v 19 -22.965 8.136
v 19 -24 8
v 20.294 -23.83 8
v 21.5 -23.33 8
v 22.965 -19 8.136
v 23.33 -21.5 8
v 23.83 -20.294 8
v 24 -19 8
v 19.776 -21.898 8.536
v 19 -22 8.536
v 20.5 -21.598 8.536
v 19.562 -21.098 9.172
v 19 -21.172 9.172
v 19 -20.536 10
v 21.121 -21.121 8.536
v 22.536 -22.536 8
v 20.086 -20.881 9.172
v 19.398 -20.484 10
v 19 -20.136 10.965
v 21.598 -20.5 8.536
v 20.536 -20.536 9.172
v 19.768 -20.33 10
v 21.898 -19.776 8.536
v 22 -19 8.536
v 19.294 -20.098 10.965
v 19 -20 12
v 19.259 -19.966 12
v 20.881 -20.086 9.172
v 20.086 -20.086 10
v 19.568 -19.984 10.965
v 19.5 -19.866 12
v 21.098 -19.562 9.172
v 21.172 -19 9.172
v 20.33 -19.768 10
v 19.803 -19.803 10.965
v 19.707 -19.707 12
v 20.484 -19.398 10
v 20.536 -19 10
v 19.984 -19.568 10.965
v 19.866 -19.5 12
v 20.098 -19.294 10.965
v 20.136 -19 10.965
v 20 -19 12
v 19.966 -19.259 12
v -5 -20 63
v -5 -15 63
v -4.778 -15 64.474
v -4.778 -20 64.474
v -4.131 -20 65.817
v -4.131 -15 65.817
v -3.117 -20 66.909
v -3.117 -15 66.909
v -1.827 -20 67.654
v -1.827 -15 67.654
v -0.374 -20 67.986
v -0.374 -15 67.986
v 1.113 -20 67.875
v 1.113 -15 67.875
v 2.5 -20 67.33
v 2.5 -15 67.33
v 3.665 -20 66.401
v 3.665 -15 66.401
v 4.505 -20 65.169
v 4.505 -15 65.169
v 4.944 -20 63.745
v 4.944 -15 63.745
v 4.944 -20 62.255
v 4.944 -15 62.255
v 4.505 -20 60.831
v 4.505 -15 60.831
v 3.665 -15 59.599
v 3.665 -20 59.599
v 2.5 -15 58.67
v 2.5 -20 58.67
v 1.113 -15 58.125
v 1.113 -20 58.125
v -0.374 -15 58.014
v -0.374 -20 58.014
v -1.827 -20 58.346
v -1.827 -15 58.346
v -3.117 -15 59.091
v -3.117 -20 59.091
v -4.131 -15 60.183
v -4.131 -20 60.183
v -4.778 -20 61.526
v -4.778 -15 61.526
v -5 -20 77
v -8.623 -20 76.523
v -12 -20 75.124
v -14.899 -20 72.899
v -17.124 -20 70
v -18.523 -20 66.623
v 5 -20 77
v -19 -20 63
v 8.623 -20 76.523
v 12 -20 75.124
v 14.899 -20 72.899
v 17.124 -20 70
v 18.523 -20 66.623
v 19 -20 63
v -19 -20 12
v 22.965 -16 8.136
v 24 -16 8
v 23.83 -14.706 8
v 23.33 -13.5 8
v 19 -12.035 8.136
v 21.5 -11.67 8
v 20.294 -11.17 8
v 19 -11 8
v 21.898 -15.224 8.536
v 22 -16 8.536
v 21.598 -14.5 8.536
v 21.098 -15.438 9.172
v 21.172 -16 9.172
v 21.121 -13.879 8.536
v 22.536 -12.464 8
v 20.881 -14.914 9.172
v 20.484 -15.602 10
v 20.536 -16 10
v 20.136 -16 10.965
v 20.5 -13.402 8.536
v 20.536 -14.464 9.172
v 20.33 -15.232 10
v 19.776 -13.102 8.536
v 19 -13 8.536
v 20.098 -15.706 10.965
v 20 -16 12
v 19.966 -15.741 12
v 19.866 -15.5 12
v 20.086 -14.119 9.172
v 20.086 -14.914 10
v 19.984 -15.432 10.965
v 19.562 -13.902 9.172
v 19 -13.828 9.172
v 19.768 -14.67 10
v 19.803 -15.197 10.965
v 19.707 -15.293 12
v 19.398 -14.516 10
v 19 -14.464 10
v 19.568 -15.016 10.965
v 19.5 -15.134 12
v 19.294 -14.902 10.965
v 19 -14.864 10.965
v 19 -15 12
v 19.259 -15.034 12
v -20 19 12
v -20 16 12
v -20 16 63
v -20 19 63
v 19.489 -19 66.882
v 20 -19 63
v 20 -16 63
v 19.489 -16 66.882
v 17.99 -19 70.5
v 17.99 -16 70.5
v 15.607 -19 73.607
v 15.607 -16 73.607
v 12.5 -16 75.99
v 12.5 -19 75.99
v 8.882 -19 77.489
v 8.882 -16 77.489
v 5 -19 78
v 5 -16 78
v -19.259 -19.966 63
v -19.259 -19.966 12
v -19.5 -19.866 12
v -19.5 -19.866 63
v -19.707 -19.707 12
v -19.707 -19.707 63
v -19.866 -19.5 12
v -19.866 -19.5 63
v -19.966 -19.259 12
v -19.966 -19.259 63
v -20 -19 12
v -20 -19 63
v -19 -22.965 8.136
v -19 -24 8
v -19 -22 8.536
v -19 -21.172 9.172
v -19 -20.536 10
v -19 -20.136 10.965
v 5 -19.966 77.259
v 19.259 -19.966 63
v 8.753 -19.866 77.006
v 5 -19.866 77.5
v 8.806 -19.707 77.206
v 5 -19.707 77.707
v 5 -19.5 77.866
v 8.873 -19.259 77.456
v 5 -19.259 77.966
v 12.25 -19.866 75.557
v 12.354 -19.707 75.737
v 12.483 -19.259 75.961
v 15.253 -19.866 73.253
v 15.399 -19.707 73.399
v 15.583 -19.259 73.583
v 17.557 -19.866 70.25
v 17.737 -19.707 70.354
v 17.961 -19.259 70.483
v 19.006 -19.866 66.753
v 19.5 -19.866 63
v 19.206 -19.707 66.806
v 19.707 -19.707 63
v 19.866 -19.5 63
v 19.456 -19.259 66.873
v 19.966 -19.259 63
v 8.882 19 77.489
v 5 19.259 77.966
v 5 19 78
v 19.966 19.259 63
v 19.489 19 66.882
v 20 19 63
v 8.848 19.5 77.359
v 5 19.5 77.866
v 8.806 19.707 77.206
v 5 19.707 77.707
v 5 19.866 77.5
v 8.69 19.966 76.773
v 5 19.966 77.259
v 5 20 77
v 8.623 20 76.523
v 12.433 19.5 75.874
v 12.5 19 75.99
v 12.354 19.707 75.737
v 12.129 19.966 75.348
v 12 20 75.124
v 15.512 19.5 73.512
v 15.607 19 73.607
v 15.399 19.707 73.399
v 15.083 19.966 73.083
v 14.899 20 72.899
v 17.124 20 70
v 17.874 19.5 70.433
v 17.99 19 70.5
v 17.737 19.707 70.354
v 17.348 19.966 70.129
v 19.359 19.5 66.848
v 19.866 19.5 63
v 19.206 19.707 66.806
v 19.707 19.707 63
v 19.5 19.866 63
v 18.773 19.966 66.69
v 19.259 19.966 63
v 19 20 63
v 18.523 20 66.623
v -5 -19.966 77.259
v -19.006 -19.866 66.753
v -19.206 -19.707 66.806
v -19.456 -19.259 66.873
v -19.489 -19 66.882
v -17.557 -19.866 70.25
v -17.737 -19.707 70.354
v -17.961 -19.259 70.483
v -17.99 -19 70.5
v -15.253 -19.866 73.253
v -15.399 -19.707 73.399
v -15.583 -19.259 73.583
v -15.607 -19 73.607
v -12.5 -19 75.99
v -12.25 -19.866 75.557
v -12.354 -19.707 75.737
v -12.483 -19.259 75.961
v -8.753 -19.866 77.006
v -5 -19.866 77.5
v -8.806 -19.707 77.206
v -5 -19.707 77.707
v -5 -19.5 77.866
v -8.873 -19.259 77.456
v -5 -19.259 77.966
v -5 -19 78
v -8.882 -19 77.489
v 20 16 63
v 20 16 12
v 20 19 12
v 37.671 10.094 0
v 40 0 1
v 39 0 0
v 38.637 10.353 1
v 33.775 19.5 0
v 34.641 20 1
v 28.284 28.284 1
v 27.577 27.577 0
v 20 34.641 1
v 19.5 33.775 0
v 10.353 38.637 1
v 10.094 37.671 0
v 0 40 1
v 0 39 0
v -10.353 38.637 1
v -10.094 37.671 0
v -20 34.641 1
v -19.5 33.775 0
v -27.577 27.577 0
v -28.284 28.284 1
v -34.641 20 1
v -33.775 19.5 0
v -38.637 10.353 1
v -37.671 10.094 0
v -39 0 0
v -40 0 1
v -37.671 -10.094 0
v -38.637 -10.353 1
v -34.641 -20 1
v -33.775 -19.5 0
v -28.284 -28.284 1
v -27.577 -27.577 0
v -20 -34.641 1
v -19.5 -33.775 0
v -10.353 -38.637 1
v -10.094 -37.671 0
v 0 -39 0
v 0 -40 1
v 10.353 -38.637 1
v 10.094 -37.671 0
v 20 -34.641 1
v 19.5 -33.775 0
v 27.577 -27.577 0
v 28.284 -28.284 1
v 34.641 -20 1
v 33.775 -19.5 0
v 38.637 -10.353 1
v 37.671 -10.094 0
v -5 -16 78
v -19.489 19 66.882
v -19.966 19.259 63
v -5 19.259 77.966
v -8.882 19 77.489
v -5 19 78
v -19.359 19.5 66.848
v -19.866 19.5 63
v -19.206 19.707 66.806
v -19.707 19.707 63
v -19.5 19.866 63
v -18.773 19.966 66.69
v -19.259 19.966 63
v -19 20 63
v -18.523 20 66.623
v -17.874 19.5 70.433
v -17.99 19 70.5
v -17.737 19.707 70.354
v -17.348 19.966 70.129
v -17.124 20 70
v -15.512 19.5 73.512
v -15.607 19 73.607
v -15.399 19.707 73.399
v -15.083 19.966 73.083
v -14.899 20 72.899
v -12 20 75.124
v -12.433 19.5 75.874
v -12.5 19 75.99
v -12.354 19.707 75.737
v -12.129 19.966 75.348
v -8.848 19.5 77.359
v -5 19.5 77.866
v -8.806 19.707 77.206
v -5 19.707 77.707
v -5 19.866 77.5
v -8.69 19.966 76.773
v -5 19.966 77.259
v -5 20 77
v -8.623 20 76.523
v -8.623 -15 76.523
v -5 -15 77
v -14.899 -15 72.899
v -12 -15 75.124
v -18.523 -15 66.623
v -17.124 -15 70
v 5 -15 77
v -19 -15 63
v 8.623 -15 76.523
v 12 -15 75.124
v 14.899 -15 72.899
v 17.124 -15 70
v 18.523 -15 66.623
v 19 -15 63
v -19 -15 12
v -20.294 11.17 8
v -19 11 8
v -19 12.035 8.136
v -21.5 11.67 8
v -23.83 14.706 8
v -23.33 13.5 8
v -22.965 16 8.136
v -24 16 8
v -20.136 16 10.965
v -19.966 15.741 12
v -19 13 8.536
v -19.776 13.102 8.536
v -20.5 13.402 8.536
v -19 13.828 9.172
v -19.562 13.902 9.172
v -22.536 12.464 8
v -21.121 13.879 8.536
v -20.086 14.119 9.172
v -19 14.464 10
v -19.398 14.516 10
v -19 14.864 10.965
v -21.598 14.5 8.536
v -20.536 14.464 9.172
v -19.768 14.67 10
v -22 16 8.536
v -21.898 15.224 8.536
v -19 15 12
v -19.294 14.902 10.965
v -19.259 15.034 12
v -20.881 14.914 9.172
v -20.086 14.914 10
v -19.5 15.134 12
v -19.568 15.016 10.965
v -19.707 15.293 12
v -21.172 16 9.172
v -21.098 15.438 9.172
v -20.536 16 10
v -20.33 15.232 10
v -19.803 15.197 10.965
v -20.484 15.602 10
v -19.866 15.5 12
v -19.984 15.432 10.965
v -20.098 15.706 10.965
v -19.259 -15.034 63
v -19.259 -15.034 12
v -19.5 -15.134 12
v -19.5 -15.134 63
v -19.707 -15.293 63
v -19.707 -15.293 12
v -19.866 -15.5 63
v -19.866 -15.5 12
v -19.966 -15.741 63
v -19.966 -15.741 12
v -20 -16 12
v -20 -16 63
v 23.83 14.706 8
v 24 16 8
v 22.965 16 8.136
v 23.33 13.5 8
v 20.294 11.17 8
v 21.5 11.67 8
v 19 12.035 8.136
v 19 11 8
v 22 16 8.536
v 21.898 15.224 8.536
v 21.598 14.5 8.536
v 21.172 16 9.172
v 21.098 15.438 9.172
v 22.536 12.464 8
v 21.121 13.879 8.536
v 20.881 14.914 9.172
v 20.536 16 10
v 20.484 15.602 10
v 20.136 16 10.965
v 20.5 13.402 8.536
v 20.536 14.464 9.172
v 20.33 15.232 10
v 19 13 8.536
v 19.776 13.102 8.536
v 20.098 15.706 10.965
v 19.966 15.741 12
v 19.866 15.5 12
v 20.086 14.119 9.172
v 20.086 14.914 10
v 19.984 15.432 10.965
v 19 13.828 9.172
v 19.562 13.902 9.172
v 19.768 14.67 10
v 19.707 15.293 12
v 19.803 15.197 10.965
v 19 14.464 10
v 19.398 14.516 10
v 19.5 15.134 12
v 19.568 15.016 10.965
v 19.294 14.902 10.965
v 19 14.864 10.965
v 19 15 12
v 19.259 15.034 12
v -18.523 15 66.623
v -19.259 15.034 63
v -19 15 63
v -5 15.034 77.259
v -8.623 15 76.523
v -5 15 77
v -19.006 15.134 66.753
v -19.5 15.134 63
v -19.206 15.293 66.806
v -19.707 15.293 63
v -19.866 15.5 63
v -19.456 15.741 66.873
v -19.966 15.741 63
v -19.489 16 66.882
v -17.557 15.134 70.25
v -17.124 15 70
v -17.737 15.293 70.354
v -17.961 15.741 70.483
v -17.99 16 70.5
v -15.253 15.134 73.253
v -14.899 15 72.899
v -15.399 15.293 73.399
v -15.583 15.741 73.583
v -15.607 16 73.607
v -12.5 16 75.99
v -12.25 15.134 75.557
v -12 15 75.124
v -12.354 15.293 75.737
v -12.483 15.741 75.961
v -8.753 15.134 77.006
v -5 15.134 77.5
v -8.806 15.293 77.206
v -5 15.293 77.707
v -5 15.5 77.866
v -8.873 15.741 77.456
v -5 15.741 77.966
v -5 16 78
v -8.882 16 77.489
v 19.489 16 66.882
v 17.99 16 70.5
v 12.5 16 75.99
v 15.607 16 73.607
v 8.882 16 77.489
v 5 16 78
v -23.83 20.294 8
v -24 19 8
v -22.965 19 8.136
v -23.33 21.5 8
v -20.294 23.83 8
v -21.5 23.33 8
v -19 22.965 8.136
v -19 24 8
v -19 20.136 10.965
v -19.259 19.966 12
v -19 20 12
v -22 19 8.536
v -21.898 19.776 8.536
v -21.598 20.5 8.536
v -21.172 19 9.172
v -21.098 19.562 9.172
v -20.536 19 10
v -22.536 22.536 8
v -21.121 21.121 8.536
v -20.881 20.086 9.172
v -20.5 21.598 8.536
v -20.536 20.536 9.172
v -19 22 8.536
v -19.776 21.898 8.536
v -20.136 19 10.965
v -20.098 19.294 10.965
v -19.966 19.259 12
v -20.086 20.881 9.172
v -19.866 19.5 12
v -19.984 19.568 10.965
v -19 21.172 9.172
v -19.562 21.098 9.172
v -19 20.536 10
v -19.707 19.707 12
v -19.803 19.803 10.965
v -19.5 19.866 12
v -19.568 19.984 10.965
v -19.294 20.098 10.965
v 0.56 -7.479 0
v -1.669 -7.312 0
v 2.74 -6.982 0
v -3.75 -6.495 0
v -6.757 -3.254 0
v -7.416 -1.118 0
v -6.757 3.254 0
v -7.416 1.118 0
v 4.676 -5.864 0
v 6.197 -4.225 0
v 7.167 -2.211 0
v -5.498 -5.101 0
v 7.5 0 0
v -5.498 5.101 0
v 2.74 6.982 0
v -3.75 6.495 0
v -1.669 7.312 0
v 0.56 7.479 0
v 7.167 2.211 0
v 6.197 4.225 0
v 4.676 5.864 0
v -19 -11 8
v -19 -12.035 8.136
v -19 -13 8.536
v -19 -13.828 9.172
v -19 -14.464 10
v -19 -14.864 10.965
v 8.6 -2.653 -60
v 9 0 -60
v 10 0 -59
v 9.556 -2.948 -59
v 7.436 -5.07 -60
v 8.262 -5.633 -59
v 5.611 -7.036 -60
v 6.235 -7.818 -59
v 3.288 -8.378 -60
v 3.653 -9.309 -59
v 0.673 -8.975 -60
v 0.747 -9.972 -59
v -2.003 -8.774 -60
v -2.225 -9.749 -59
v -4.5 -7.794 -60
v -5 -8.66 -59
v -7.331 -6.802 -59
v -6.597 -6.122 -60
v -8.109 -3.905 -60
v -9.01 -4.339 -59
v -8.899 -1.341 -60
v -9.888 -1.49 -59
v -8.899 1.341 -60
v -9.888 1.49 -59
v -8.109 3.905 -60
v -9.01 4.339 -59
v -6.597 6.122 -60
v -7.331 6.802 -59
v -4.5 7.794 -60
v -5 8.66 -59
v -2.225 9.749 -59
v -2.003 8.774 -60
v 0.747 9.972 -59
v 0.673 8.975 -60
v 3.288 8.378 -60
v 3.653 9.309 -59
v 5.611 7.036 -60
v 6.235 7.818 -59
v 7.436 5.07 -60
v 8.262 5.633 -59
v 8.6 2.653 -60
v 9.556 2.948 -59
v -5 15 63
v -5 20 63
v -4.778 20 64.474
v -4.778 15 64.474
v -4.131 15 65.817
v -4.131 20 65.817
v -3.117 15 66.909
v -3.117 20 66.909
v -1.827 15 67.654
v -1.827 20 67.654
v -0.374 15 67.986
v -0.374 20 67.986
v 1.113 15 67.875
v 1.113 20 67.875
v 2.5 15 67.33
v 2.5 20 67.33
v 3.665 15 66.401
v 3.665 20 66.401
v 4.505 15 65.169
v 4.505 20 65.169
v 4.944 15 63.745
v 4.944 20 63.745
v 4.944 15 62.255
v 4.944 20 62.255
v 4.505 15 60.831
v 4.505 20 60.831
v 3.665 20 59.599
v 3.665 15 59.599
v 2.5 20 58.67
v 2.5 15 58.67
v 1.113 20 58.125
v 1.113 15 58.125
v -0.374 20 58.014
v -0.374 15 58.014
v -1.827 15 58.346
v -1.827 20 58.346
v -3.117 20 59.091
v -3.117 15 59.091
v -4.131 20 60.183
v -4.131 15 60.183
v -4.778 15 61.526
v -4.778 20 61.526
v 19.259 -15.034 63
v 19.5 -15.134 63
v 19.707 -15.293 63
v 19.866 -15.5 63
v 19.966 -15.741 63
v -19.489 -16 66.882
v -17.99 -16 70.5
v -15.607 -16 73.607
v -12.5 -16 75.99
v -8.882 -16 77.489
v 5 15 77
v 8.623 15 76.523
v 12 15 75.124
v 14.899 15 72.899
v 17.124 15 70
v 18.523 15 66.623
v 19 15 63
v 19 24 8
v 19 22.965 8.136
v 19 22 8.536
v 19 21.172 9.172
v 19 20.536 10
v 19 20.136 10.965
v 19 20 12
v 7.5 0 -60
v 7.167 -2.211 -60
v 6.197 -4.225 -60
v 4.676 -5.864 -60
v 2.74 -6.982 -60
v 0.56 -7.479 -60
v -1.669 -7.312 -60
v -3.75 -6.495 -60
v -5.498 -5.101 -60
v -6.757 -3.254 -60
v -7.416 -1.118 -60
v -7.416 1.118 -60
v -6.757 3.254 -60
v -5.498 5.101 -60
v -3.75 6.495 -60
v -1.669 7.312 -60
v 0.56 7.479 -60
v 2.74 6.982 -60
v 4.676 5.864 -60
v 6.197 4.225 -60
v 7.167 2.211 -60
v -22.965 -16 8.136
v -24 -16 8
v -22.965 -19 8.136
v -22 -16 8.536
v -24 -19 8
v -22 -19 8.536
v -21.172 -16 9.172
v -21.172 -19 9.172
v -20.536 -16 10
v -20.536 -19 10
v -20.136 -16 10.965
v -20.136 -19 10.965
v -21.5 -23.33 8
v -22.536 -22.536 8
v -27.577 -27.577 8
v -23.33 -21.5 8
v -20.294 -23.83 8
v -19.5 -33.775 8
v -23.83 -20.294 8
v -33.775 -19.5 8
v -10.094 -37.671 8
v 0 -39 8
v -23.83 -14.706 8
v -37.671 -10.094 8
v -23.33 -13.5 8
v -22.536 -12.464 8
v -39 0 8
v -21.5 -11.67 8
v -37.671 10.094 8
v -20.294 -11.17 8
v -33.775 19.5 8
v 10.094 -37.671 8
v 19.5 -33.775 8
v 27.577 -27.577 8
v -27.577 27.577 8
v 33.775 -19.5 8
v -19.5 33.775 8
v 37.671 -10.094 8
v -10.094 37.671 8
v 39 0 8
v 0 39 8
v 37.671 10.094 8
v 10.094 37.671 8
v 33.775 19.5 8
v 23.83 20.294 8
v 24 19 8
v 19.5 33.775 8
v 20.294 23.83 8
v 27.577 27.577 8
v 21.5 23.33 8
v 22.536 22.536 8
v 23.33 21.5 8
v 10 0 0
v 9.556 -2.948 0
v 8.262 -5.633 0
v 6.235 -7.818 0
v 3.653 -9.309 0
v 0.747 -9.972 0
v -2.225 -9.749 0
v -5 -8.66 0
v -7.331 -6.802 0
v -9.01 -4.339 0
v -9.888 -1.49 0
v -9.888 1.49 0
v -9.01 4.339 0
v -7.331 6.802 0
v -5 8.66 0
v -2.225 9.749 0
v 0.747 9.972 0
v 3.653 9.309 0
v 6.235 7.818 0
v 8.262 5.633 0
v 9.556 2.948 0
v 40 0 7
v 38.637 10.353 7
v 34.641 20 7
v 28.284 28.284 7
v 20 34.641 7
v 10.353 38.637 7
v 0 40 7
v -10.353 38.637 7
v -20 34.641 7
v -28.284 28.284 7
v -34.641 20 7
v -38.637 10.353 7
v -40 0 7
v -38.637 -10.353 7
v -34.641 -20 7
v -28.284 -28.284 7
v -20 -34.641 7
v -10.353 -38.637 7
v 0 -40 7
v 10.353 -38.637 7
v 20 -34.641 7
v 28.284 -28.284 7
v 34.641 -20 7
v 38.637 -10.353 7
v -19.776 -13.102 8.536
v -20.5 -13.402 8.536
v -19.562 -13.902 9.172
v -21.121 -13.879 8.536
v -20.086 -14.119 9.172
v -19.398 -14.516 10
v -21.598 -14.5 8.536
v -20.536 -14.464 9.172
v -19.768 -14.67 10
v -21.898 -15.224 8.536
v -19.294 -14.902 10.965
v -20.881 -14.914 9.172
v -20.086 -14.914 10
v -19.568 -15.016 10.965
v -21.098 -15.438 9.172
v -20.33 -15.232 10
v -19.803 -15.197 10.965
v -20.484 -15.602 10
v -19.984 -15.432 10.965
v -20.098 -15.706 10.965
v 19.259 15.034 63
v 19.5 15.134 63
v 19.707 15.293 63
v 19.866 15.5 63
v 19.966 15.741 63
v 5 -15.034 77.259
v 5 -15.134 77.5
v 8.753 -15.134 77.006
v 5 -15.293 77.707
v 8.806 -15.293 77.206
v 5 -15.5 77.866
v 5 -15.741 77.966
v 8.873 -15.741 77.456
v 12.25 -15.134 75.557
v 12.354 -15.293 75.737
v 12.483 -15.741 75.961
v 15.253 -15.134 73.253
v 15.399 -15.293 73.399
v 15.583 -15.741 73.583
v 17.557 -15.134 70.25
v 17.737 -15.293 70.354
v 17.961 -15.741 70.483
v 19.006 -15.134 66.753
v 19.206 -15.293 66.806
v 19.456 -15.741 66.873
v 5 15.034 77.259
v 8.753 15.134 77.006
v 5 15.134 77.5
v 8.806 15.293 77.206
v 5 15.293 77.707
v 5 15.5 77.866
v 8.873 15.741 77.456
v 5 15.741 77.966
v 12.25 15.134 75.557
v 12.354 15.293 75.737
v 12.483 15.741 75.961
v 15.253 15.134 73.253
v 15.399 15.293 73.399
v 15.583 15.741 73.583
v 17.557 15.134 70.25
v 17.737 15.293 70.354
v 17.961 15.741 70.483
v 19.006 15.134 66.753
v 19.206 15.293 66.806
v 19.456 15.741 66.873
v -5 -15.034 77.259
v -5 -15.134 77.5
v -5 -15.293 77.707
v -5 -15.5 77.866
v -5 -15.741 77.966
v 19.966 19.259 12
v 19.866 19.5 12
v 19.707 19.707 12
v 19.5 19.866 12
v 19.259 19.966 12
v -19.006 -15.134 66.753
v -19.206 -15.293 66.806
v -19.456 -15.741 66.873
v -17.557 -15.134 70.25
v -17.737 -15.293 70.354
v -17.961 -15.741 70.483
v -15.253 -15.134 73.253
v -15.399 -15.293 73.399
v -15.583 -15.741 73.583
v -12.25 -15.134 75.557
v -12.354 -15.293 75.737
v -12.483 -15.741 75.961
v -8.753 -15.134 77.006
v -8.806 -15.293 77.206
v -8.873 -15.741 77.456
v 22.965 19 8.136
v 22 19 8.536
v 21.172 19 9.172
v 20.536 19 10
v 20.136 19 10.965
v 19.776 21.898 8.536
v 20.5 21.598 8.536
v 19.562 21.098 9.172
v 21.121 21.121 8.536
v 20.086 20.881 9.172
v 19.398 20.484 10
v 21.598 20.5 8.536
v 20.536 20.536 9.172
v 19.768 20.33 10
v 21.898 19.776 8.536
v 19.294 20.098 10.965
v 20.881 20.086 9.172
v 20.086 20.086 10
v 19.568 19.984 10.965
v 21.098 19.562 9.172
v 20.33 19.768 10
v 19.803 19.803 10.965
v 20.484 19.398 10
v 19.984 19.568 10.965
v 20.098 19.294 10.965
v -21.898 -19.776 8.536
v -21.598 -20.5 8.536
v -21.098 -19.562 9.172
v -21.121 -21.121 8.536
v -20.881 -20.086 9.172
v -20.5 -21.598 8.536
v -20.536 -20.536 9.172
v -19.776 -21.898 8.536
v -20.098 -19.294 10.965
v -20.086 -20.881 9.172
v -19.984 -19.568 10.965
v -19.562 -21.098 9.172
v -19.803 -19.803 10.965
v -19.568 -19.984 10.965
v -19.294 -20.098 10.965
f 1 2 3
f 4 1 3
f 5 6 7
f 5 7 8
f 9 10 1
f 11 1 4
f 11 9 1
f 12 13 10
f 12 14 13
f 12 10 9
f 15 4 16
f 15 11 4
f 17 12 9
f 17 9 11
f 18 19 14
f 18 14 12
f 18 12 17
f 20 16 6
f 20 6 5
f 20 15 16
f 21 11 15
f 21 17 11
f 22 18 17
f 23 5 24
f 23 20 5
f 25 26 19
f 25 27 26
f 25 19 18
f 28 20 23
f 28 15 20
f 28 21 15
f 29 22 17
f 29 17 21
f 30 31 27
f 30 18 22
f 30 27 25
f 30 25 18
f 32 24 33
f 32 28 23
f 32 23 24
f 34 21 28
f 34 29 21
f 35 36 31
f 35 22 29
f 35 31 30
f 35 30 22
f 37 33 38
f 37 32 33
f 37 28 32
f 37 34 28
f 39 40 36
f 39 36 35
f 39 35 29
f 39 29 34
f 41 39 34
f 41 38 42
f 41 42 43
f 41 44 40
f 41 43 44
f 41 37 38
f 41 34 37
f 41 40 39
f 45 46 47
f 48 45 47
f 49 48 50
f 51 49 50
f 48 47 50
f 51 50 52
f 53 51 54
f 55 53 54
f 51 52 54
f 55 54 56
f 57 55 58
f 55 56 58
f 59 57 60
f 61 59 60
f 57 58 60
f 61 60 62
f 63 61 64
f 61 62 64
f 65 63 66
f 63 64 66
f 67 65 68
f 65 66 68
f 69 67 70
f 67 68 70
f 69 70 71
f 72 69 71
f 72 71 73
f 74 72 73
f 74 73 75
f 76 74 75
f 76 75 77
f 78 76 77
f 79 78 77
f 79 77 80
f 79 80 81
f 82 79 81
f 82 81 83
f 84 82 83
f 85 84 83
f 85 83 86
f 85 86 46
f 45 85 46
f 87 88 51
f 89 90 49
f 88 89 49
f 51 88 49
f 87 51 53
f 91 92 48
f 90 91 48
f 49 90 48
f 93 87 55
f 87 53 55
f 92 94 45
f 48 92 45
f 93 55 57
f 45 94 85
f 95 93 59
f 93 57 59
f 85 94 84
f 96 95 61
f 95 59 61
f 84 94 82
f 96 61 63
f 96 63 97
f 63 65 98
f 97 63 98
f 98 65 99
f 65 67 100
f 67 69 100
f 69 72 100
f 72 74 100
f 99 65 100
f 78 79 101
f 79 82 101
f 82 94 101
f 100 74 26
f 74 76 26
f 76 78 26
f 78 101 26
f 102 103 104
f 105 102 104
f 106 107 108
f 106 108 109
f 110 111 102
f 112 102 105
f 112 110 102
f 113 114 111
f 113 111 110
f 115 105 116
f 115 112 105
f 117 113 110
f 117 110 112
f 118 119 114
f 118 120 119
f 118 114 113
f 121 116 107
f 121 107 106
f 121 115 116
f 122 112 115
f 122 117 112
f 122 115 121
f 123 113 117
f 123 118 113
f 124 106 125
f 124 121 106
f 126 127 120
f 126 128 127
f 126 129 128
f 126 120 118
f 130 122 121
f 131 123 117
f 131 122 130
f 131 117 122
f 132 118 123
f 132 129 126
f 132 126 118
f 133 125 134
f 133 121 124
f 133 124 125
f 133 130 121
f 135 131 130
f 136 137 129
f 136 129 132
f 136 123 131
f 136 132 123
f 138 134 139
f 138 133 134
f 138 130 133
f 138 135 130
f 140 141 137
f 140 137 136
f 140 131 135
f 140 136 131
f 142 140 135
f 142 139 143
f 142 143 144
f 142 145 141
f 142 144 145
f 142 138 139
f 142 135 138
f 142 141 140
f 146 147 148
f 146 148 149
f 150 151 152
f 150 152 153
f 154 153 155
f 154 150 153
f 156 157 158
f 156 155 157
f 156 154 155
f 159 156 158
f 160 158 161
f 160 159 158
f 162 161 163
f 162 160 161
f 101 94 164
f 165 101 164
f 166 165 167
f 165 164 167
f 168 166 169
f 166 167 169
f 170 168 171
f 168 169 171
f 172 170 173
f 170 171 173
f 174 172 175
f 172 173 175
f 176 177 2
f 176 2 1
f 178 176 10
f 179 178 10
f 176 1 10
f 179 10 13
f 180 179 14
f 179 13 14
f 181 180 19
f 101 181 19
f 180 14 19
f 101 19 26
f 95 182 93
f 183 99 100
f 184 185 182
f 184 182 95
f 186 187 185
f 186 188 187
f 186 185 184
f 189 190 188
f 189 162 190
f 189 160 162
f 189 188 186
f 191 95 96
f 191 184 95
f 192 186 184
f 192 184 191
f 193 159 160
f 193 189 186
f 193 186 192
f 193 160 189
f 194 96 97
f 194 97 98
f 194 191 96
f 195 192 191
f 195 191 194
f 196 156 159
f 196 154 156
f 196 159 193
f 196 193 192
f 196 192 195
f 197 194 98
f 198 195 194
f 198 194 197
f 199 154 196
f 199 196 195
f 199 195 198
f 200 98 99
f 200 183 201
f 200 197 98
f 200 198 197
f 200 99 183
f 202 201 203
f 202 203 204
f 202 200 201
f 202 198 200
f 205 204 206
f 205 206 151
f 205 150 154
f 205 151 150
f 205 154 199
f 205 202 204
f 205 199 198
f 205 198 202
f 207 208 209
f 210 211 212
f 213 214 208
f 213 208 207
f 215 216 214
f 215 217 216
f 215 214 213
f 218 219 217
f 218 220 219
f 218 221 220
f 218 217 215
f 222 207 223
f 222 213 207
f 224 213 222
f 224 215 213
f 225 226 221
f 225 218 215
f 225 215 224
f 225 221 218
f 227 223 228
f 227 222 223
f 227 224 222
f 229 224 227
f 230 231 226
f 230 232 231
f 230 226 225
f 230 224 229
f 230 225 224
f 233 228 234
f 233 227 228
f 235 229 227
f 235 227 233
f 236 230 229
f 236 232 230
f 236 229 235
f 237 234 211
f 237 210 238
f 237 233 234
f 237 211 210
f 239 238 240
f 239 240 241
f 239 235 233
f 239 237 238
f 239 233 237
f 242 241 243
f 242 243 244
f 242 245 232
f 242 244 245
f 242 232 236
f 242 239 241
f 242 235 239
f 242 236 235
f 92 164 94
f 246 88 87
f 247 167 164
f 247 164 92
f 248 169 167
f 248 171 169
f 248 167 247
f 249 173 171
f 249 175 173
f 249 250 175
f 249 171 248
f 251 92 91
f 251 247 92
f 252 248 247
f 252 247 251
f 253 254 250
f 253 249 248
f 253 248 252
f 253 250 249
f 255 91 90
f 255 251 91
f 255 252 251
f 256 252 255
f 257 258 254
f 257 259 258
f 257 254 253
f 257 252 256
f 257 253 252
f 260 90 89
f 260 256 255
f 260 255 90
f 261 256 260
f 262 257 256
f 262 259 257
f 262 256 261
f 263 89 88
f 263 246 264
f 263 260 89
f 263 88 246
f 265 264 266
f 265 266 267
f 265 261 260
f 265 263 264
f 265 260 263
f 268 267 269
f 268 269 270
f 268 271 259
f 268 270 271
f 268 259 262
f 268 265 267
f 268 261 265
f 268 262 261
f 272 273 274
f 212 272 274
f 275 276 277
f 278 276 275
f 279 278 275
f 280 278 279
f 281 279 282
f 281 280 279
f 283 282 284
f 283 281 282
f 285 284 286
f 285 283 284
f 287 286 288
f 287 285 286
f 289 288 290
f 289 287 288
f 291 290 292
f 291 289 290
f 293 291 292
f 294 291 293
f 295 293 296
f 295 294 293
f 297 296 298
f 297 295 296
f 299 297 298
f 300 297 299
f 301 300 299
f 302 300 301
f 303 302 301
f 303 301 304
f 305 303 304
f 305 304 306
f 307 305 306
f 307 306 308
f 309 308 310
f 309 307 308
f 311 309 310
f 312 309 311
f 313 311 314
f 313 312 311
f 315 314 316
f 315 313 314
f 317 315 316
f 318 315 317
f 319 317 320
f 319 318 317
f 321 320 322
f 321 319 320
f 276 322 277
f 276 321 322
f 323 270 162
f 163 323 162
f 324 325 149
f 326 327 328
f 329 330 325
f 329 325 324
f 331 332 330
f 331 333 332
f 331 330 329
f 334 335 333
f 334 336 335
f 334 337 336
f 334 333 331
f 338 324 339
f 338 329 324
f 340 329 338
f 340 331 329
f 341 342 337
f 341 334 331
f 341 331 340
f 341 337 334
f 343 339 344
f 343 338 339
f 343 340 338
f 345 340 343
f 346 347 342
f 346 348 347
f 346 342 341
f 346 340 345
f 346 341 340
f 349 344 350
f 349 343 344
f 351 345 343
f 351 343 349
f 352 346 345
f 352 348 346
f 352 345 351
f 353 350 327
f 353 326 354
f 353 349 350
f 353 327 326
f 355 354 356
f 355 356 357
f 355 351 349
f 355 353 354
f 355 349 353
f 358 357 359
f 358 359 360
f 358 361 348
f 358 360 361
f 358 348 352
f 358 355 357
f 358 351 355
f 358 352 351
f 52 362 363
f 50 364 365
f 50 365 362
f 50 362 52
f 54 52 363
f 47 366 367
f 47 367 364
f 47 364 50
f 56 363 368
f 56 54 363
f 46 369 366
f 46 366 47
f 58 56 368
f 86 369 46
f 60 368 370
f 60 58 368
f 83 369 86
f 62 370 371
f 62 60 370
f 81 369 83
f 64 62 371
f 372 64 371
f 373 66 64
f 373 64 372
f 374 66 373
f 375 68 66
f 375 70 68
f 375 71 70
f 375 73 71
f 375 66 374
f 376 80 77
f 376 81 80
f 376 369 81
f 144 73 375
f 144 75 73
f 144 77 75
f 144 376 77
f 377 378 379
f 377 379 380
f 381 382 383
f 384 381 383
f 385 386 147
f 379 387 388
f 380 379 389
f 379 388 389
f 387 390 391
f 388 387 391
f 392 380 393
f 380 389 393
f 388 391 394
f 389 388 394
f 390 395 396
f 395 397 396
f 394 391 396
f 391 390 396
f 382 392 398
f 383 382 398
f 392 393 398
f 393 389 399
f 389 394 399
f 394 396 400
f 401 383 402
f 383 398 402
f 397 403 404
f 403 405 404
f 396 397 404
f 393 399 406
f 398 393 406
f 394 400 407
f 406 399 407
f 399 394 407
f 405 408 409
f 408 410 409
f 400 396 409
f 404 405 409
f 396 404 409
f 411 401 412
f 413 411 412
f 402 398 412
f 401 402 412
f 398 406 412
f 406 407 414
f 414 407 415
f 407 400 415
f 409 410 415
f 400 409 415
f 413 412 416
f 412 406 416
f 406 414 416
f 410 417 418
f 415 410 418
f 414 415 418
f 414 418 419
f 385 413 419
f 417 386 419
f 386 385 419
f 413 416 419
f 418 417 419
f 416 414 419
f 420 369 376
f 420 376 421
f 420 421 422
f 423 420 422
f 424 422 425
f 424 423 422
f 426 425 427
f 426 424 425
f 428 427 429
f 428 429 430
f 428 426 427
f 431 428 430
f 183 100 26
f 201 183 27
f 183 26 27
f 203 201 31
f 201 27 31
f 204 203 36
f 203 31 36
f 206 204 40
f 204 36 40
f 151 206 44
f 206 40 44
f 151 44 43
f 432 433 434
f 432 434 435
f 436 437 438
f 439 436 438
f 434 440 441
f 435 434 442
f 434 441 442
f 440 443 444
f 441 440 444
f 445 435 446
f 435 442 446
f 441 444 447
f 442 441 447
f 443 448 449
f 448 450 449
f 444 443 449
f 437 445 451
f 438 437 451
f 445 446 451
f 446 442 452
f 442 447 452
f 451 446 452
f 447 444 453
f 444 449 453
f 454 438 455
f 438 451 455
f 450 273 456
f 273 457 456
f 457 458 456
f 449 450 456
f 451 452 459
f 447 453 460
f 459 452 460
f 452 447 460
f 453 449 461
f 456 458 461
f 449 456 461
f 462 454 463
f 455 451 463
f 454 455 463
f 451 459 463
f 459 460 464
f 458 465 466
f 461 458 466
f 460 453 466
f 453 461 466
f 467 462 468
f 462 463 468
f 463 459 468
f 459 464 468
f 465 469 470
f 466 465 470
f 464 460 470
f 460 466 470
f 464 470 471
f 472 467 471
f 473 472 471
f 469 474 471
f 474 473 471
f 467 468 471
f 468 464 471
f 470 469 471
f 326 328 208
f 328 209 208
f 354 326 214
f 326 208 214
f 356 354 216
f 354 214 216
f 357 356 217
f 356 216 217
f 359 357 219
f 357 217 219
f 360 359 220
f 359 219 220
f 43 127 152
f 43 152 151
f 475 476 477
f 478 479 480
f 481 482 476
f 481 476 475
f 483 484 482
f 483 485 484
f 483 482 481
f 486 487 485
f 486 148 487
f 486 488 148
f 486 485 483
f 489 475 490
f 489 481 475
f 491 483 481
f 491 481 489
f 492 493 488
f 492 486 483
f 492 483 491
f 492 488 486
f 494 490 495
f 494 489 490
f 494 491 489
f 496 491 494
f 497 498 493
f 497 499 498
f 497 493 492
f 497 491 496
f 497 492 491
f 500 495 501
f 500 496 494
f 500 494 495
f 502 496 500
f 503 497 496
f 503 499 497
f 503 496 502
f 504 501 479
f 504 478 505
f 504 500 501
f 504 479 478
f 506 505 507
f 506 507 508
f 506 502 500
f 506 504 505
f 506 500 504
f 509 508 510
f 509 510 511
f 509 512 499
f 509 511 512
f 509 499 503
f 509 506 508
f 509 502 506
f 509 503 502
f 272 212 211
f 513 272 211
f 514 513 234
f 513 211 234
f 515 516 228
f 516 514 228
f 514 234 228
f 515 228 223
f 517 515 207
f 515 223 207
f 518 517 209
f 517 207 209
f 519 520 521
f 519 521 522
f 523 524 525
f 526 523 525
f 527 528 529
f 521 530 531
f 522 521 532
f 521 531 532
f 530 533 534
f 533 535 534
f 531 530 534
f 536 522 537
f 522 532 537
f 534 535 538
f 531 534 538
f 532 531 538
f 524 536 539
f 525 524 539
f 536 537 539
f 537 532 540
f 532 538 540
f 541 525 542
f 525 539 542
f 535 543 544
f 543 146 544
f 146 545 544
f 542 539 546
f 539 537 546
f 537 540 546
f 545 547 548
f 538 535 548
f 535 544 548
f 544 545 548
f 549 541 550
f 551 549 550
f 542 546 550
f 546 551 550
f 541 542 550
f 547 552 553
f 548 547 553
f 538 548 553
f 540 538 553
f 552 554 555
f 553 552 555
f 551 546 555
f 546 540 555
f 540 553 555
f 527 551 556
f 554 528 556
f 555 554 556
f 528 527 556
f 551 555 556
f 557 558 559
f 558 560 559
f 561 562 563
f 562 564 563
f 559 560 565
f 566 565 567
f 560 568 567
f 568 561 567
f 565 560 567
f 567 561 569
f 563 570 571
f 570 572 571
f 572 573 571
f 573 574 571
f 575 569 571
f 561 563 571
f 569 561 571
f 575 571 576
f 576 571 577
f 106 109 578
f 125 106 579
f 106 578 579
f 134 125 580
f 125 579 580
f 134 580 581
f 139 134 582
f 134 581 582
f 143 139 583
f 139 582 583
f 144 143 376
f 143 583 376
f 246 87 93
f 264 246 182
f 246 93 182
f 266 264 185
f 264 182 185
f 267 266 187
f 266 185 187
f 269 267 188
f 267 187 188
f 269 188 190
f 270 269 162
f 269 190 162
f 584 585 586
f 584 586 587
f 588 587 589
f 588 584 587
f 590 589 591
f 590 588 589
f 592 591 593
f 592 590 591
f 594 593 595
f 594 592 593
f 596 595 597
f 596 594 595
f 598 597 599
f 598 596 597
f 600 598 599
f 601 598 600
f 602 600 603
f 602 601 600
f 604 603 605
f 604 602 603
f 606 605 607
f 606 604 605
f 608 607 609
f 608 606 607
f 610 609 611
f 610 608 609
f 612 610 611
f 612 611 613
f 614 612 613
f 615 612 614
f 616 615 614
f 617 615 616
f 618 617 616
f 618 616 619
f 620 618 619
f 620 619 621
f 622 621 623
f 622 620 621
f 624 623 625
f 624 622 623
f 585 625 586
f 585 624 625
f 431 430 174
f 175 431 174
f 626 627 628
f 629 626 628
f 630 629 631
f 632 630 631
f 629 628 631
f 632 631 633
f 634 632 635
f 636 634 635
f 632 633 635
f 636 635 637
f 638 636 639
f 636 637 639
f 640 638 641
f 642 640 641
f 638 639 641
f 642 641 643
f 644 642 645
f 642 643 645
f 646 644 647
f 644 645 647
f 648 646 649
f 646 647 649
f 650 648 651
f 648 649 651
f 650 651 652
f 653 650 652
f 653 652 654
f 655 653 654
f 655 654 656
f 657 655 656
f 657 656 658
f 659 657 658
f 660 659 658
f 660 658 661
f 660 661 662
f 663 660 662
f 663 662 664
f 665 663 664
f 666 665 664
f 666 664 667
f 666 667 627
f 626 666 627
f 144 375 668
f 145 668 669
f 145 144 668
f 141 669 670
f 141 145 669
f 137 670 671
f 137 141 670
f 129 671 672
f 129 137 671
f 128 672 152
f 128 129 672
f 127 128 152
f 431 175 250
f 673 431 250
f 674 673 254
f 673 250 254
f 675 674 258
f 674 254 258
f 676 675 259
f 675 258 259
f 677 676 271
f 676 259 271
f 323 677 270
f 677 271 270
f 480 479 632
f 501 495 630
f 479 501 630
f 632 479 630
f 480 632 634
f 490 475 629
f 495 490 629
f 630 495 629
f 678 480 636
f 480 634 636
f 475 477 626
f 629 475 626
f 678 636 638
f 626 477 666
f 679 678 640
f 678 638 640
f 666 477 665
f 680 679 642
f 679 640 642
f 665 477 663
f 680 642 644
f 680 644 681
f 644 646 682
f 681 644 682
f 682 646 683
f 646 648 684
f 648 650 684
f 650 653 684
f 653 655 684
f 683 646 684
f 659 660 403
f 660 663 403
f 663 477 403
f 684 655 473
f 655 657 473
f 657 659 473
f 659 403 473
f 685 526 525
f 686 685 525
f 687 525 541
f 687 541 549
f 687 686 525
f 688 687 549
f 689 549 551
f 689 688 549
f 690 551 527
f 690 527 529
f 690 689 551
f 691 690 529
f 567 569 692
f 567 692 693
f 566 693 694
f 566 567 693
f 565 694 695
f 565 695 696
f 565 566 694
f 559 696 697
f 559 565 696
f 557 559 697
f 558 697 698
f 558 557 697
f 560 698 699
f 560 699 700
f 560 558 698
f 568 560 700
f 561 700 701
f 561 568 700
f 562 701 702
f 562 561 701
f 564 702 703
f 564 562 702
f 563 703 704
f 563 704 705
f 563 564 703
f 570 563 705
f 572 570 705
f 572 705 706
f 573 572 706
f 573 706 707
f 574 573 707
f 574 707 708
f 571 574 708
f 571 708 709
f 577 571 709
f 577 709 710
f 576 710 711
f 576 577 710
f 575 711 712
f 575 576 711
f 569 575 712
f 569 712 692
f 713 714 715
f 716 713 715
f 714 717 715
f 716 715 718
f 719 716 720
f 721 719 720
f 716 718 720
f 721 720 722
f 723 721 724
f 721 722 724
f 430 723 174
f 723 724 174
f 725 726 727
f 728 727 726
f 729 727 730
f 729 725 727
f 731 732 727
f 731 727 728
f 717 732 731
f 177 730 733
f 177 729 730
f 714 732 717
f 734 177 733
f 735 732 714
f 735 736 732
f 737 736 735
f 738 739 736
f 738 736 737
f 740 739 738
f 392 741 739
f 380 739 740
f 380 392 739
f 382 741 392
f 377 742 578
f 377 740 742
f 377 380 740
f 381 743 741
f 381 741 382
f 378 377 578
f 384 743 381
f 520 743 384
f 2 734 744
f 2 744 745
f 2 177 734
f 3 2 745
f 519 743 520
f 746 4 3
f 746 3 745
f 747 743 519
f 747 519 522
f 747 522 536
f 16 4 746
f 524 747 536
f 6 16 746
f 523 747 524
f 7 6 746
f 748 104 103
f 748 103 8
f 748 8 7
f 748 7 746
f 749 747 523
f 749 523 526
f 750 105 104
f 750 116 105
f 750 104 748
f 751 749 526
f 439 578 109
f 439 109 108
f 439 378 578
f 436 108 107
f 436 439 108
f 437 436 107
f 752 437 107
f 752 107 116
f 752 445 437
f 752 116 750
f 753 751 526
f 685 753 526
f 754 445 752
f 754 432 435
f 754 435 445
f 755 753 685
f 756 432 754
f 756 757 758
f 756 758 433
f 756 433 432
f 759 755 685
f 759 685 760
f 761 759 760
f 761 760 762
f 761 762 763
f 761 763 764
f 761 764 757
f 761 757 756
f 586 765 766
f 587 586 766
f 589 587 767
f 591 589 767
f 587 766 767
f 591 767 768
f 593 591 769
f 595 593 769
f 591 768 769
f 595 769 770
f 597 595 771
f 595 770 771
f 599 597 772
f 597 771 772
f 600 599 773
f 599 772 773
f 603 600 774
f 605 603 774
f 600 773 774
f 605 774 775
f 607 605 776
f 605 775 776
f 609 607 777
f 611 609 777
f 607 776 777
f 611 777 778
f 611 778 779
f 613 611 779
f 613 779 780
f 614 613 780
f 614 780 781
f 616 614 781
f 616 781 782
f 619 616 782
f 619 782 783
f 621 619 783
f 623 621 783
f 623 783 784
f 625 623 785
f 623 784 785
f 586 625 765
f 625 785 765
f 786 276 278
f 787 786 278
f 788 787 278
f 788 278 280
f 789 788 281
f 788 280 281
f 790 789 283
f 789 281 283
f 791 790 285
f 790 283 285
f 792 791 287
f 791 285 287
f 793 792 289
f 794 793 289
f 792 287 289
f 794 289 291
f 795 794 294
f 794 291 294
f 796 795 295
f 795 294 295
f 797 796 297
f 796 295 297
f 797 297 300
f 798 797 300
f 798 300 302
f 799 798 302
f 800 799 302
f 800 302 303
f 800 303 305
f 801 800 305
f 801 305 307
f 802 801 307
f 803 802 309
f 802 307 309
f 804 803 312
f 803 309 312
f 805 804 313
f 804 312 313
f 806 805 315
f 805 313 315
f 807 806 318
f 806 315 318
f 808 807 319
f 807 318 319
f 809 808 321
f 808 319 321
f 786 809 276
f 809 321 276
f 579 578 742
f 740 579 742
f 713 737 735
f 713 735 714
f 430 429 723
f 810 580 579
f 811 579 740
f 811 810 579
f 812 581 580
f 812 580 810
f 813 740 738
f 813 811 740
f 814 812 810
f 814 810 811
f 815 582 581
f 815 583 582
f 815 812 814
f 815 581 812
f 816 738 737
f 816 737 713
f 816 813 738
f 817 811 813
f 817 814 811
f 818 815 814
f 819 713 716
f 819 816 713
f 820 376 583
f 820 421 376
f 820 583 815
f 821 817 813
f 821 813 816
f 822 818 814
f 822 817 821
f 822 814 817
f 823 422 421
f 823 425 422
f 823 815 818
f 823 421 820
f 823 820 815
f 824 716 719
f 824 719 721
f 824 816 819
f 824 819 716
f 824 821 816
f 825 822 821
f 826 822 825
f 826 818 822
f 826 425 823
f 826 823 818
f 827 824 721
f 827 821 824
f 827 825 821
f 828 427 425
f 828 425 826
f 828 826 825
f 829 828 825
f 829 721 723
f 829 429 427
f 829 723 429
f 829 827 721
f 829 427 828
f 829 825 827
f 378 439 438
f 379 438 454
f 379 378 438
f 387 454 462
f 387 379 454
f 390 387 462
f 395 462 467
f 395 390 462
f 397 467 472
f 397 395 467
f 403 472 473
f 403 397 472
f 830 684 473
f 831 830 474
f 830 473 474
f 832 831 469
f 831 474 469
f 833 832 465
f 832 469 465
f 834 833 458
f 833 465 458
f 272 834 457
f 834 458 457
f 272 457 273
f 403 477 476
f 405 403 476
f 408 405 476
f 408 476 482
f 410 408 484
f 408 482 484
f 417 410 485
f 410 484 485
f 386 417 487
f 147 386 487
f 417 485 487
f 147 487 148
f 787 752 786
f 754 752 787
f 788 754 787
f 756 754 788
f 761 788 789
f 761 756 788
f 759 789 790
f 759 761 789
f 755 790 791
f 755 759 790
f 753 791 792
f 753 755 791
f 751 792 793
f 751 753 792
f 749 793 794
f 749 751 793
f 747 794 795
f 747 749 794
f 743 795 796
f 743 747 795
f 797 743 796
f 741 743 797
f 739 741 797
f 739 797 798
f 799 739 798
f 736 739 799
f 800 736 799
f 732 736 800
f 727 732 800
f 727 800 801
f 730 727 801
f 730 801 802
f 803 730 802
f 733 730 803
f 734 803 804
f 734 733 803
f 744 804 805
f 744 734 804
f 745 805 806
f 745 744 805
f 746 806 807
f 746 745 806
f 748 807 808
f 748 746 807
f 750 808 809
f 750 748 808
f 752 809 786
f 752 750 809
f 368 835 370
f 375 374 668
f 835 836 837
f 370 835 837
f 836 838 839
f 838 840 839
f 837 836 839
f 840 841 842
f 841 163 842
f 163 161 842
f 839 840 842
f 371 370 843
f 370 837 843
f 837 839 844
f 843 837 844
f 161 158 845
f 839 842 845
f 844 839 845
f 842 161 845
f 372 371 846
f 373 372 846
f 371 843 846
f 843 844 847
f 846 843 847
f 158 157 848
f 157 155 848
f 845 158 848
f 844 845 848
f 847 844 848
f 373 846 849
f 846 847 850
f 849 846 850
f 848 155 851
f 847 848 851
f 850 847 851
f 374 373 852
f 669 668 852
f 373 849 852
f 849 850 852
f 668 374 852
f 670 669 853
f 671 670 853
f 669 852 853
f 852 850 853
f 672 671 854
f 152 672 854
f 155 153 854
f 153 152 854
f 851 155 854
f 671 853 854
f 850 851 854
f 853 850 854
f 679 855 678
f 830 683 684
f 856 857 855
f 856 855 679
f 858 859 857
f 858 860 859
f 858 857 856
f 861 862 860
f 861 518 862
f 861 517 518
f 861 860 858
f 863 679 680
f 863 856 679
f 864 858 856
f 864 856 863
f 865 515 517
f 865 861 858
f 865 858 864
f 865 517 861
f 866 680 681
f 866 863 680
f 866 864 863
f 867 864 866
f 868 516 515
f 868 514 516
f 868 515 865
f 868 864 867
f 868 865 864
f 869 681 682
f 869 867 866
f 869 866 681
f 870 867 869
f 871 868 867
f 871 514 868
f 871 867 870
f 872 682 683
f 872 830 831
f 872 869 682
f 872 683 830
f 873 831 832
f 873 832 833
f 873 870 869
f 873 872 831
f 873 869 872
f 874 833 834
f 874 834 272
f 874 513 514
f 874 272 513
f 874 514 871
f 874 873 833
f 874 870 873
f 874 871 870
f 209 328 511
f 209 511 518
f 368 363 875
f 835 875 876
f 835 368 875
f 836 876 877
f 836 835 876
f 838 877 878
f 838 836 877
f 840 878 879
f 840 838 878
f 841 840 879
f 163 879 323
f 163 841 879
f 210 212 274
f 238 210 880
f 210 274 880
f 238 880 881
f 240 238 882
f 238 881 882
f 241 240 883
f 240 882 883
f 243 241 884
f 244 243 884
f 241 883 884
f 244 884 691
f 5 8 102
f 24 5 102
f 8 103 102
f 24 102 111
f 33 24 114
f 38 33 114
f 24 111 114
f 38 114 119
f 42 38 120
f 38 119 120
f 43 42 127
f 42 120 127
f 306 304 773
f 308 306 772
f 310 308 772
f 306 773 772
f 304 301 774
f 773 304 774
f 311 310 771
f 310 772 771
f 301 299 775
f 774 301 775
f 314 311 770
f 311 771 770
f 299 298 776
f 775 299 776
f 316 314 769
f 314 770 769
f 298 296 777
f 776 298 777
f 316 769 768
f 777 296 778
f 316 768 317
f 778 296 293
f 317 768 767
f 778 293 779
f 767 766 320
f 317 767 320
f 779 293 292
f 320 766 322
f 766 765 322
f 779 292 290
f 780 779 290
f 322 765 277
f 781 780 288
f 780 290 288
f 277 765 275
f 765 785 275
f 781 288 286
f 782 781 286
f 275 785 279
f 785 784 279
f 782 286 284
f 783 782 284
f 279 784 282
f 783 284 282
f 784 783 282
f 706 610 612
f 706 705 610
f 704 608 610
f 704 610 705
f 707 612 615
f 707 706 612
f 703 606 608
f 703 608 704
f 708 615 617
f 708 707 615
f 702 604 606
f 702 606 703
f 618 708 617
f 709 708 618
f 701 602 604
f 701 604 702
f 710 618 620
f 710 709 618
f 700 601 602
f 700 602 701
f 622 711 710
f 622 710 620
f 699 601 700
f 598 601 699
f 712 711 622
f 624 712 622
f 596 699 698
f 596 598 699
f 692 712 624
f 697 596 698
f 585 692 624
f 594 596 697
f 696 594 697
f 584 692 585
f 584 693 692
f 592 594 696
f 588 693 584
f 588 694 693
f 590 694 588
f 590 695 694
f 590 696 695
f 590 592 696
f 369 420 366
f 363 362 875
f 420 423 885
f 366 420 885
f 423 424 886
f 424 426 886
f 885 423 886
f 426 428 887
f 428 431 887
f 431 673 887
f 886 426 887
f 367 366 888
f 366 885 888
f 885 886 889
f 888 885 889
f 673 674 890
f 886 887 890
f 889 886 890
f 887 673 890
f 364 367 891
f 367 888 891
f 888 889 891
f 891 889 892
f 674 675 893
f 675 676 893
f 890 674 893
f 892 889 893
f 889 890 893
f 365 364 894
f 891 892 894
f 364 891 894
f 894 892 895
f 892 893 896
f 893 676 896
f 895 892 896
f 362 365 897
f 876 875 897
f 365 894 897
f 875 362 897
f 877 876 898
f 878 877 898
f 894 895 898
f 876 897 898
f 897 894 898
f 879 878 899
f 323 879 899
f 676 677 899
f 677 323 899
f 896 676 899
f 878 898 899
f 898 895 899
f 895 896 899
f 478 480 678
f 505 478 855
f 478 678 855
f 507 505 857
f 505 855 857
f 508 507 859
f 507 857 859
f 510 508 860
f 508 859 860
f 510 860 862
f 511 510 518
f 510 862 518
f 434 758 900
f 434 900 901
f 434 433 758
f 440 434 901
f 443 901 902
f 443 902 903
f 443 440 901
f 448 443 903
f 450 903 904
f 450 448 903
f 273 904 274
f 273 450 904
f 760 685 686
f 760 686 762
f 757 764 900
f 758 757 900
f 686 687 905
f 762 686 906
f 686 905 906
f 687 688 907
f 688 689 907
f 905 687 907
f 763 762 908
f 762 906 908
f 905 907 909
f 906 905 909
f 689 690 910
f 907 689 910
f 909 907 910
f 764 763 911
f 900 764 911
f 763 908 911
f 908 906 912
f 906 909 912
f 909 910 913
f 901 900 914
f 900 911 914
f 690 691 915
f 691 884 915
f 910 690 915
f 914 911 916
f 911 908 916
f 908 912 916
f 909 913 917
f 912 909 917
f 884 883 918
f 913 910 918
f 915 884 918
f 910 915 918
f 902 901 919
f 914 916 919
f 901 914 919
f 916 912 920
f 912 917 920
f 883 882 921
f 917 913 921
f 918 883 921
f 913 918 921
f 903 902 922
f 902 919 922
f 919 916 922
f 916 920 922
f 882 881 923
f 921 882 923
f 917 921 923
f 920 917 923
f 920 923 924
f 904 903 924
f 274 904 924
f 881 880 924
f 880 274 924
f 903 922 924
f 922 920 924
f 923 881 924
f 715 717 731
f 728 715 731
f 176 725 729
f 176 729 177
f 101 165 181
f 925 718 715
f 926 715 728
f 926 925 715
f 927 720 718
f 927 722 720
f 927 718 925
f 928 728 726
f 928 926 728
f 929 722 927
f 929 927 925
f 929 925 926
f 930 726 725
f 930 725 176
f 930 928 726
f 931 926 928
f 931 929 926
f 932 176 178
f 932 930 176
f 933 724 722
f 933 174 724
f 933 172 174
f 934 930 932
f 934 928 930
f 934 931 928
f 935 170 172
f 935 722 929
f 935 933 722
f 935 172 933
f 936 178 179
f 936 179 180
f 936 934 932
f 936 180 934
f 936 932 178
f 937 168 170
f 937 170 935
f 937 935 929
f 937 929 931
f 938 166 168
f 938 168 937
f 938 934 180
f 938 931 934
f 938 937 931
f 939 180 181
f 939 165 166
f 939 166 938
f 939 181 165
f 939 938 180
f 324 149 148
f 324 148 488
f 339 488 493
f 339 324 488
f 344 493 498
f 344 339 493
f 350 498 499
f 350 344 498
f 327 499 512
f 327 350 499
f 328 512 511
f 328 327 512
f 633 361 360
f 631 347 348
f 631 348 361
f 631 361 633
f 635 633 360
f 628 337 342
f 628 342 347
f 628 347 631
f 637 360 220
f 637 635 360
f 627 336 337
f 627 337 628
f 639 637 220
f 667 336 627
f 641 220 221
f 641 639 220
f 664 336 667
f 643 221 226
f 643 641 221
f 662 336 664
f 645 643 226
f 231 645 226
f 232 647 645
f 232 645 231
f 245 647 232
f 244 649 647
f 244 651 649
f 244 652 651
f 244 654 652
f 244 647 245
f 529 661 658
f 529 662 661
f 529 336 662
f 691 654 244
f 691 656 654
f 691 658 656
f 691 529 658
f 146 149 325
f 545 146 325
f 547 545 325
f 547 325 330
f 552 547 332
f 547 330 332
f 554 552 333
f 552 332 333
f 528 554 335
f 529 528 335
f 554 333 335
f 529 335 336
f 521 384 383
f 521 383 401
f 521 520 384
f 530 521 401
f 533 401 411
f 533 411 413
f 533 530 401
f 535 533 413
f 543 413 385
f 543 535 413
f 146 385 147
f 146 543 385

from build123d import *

# Parameters (mm, degrees)
SKETCH1_R            = 40
BOSS_EXTRUDE1_DEPTH  = 8
SKETCH2_W            = 40
SKETCH2_H            = 5
BOSS_EXTRUDE2_DEPTH  = 70
FILLET1_R            = 15
FILLET2_R            = 1
FILLET3_R            = 4
FILLET1_OF_MIRROR1_R = 15
FILLET2_OF_MIRROR1_R = 1
FILLET3_OF_MIRROR1_R = 4
SKETCH3_R            = 5
CUT_EXTRUDE1_DEPTH   = 107.226173873
SKETCH4_R            = 10
SKETCH4_R_2          = 7.5
BOSS_EXTRUDE3_DEPTH  = 60
CHAMFER1_SIZE        = 1
CHAMFER2_SIZE        = 1


with BuildPart() as part:
    # Sketch1 → Boss-Extrude1 (new body)
    with BuildSketch(Plane.XY):
        Circle(SKETCH1_R)
    extrude(amount=BOSS_EXTRUDE1_DEPTH)

    # Sketch2 → Boss-Extrude2 (add)
    with BuildSketch(Plane.XY.offset(8)):
        with Locations((0, 17.5)):
            Rectangle(SKETCH2_W, SKETCH2_H)
    boss_extrude2 = extrude(amount=BOSS_EXTRUDE2_DEPTH)

    # Fillet1
    fillet1_edges = [part.edges().sort_by_distance(p)[0] for p in [
        (-20, 17.5, 78),
        (20, 17.5, 78),
    ]]
    fillet(fillet1_edges, radius=FILLET1_R)

    # Fillet2
    fillet2_edges = [part.edges().sort_by_distance(p)[0] for p in [
        (0, 15, 78),
        (0, 20, 78),
        (-20, 20, 35.5),
        (20, 20, 35.5),
        (-15.606601718, 20, 73.606601718),
        (15.606601718, 20, 73.606601718),
        (20, 15, 35.5),
        (-20, 15, 35.5),
        (-15.606601718, 15, 73.606601718),
        (15.606601718, 15, 73.606601718),
    ]]
    fillet(fillet2_edges, radius=FILLET2_R)

    # Fillet3
    fillet3_edges = [part.edges().sort_by_distance(p)[0] for p in [
        (0, 20, 8),
        (20, 17.5, 8),
        (0, 15, 8),
        (-20, 17.5, 8),
        (19.707106781, 19.707106781, 8),
        (19.707106781, 15.292893219, 8),
        (-19.707106781, 19.707106781, 8),
        (-19.707106781, 15.292893219, 8),
    ]]
    fillet(fillet3_edges, radius=FILLET3_R)

    # Mirror1: Boss-Extrude2 across plane
    add(boss_extrude2.mirror(Plane.ZX))

    # Fillet1 of Mirror1
    fillet1_of_mirror1_edges = [part.edges().sort_by_distance(p)[0] for p in [
        (-20, -17.5, 78),
        (20, -17.5, 78),
    ]]
    fillet(fillet1_of_mirror1_edges, radius=FILLET1_OF_MIRROR1_R)

    # Fillet2 of Mirror1
    fillet2_of_mirror1_edges = [part.edges().sort_by_distance(p)[0] for p in [
        (0, -15, 78),
        (0, -20, 78),
        (-20, -20, 35.5),
        (20, -20, 35.5),
        (-15.606601718, -20, 73.606601718),
        (15.606601718, -20, 73.606601718),
        (20, -15, 35.5),
        (-20, -15, 35.5),
        (-15.606601718, -15, 73.606601718),
        (15.606601718, -15, 73.606601718),
    ]]
    fillet(fillet2_of_mirror1_edges, radius=FILLET2_OF_MIRROR1_R)

    # Fillet3 of Mirror1
    fillet3_of_mirror1_edges = [part.edges().sort_by_distance(p)[0] for p in [
        (0, -20, 8),
        (20, -17.5, 8),
        (0, -15, 8),
        (-20, -17.5, 8),
        (19.707106781, -19.707106781, 8),
        (19.707106781, -15.292893219, 8),
        (-19.707106781, -19.707106781, 8),
        (-19.707106781, -15.292893219, 8),
    ]]
    fillet(fillet3_of_mirror1_edges, radius=FILLET3_OF_MIRROR1_R)

    # Sketch3 → Cut-Extrude1 (cut, through all)
    with BuildSketch(Plane(origin=(0, 20, 0), x_dir=(1, 0, 0), z_dir=(0, 1, 0))):
        with Locations(Location((0, -63, 0), (0, 0, 180))):
            Circle(SKETCH3_R)
    extrude(amount=-CUT_EXTRUDE1_DEPTH, mode=Mode.SUBTRACT)

    # Sketch4 → Boss-Extrude3 (add)
    with BuildSketch(Plane(origin=(0, 0, 0), x_dir=(-1, 0, 0), z_dir=(0, 0, -1))):
        with Locations(Location((0, 0, 0), (0, 0, 180))):
            Circle(SKETCH4_R)
        with Locations(Location((0, 0, 0), (0, 0, 180))):
            Circle(SKETCH4_R_2, mode=Mode.SUBTRACT)
    extrude(amount=BOSS_EXTRUDE3_DEPTH)

    # Chamfer1
    chamfer1_edges = [part.edges().sort_by_distance(p)[0] for p in [
        (-10, 0, -60),
    ]]
    chamfer(chamfer1_edges, length=CHAMFER1_SIZE)

    # Chamfer2
    chamfer2_edges = [part.edges().sort_by_distance(p)[0] for p in [
        (-40, 0, 0),
        (-40, 0, 8),
    ]]
    chamfer(chamfer2_edges, length=CHAMFER2_SIZE)


solid = part.part
